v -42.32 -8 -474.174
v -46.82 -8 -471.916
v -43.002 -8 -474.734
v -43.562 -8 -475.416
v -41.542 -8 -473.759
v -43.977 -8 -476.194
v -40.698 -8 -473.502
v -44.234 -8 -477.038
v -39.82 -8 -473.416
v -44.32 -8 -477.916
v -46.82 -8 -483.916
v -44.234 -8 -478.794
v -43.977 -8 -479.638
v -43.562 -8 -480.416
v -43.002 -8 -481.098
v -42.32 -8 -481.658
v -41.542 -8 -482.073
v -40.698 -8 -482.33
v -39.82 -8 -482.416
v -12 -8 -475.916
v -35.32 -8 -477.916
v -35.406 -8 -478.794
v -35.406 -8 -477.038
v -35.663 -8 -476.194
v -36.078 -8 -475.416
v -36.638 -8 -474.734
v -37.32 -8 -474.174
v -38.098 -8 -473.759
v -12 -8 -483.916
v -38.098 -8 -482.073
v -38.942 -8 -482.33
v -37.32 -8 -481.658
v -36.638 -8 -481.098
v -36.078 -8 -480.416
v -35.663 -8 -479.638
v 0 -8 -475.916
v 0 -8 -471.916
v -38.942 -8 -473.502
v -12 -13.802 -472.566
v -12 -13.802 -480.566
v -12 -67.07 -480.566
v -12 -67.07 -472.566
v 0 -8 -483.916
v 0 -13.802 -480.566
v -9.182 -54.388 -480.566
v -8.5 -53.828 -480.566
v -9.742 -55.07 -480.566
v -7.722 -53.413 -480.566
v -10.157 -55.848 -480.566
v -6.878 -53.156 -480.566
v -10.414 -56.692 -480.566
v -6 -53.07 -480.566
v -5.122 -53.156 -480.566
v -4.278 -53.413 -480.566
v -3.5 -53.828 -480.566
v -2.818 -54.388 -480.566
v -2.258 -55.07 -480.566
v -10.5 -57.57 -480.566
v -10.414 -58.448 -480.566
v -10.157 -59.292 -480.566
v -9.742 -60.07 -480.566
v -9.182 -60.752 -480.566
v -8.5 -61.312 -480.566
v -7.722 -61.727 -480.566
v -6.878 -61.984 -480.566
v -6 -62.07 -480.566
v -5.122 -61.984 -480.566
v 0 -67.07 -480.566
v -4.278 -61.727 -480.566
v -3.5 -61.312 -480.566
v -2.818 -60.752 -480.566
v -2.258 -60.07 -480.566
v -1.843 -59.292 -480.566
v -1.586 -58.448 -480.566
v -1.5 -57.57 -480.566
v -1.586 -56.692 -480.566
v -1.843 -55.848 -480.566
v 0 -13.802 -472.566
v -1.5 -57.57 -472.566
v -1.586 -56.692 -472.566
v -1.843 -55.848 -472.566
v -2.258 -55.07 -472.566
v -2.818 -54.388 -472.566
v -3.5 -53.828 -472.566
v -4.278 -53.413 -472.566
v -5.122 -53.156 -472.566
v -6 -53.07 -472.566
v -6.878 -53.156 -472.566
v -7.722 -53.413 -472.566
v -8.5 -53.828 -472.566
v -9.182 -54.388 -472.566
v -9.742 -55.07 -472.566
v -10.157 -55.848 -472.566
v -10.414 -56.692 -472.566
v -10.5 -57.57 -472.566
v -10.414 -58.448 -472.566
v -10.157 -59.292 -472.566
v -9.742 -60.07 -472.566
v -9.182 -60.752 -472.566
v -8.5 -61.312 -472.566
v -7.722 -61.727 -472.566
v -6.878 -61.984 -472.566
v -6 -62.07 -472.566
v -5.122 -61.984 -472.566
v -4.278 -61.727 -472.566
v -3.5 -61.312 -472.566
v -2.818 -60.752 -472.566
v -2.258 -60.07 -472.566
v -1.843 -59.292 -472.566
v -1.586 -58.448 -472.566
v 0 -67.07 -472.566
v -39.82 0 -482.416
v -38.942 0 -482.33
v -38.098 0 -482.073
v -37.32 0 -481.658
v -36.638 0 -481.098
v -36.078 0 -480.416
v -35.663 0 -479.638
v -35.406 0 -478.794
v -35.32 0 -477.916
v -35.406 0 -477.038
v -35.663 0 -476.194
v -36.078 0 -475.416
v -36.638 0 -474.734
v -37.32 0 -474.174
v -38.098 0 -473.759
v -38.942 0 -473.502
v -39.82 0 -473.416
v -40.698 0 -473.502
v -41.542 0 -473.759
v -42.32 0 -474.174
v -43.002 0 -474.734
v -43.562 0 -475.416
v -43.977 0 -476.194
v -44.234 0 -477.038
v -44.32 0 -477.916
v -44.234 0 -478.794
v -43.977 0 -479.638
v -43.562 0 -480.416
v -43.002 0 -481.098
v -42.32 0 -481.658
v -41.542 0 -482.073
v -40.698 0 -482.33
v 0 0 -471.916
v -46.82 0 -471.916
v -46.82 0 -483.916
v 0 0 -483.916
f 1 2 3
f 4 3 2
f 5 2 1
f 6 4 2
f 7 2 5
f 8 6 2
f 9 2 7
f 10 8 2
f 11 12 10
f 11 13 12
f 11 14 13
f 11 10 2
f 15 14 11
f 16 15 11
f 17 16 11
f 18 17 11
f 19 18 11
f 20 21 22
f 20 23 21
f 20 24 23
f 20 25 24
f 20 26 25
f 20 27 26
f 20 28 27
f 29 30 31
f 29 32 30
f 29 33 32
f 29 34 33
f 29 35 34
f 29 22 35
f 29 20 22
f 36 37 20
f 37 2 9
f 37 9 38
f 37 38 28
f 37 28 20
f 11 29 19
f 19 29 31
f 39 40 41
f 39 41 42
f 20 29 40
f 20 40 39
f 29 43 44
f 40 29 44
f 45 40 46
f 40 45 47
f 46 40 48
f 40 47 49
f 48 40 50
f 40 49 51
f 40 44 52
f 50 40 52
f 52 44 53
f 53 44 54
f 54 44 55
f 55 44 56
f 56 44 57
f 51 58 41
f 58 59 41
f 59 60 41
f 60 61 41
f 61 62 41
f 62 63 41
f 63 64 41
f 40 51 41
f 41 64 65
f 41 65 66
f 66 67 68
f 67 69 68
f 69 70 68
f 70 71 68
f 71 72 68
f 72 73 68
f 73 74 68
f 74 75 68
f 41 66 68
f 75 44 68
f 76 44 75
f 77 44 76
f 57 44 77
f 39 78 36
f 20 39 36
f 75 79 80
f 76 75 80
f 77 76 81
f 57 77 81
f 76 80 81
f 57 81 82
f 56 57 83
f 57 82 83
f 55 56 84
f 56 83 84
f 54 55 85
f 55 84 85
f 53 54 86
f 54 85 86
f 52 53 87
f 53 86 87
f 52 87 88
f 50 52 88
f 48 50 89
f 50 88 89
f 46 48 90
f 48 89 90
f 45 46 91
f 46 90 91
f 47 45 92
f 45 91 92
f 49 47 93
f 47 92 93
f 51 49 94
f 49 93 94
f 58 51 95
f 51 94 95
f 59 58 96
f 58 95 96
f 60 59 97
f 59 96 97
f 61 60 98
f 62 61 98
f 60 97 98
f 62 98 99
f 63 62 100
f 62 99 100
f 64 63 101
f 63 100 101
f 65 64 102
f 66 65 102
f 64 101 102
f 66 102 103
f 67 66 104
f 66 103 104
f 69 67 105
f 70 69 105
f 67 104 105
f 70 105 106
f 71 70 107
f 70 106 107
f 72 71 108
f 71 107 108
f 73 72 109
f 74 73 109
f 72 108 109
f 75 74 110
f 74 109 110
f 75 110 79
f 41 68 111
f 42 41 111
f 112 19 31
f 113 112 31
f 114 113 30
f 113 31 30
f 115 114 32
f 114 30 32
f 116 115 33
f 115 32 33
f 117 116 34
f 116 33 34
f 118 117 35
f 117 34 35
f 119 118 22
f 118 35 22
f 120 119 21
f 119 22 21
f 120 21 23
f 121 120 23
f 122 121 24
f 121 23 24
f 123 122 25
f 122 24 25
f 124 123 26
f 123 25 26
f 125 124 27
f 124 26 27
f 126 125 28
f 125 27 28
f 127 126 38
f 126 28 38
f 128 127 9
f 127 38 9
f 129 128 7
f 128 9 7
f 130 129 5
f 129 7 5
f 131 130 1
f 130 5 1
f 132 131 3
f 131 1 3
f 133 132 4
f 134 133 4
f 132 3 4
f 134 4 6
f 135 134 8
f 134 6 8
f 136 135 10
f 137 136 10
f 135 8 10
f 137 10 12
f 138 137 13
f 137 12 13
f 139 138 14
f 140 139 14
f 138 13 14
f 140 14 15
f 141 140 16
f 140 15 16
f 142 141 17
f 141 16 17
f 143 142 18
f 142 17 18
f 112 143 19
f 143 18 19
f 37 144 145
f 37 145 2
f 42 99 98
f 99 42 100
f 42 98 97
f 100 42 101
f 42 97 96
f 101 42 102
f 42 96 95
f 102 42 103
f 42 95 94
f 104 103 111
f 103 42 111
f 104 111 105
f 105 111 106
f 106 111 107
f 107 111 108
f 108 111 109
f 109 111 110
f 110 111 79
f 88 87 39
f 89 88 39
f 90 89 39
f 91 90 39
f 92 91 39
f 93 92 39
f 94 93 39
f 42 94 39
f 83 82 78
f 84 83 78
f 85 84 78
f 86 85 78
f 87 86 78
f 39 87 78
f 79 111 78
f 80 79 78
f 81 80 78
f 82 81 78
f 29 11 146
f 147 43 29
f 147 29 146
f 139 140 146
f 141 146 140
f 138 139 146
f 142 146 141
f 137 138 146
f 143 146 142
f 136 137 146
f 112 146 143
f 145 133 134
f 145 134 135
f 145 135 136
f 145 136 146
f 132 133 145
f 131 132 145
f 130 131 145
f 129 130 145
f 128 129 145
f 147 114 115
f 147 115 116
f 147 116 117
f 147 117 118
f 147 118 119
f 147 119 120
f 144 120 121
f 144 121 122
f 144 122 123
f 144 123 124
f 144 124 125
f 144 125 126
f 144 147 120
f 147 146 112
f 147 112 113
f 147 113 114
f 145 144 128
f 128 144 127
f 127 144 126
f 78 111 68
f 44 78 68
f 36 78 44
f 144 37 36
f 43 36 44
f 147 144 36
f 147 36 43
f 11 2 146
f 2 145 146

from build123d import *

# Parameters (mm, degrees)
BOSS_EXTRUDE1_DEPTH = 12
BOSS_EXTRUDE2_DEPTH = 46.82
SKETCH3_R           = 4.5
CUT_EXTRUDE2_DEPTH  = 8
SKETCH5_R           = 4.5
CUT_EXTRUDE4_DEPTH  = 8


with BuildPart() as part:
    # Sketch1 → Boss-Extrude1 (new body)
    with BuildSketch(Plane(origin=(0, 0, 0), x_dir=(0, 0, -1), z_dir=(1, 0, 0))):
        Polygon((475.915980223, -8), (483.915980223, -8), (480.565980223, -13.802370205), (480.565980223, -67.07), (472.565980223, -67.07), (472.565980223, -13.802370205), align=None)
    extrude(amount=-BOSS_EXTRUDE1_DEPTH)

    # Sketch1<3> → Boss-Extrude2 (add)
    with BuildSketch(Plane(origin=(0, 0, 0), x_dir=(0, 0, -1), z_dir=(1, 0, 0))):
        Polygon((471.915980223, -8), (475.915980223, -8), (483.915980223, -8), (483.915980223, 0), (471.915980223, 0), align=None)
    extrude(amount=-BOSS_EXTRUDE2_DEPTH)

    # Sketch3 → Cut-Extrude2 (cut)
    with BuildSketch(Plane.XZ.offset(8)):
        with Locations(Location((-39.82, -477.915980223, 0), (0, 0, 270))):
            Circle(SKETCH3_R)
    extrude(amount=-CUT_EXTRUDE2_DEPTH, mode=Mode.SUBTRACT)

    # Sketch5 → Cut-Extrude4 (cut)
    with BuildSketch(Plane.XY.offset(-472.565980223)):
        with Locations((-6, -57.57)):
            Circle(SKETCH5_R)
    extrude(amount=-CUT_EXTRUDE4_DEPTH, mode=Mode.SUBTRACT)


solid = part.part
